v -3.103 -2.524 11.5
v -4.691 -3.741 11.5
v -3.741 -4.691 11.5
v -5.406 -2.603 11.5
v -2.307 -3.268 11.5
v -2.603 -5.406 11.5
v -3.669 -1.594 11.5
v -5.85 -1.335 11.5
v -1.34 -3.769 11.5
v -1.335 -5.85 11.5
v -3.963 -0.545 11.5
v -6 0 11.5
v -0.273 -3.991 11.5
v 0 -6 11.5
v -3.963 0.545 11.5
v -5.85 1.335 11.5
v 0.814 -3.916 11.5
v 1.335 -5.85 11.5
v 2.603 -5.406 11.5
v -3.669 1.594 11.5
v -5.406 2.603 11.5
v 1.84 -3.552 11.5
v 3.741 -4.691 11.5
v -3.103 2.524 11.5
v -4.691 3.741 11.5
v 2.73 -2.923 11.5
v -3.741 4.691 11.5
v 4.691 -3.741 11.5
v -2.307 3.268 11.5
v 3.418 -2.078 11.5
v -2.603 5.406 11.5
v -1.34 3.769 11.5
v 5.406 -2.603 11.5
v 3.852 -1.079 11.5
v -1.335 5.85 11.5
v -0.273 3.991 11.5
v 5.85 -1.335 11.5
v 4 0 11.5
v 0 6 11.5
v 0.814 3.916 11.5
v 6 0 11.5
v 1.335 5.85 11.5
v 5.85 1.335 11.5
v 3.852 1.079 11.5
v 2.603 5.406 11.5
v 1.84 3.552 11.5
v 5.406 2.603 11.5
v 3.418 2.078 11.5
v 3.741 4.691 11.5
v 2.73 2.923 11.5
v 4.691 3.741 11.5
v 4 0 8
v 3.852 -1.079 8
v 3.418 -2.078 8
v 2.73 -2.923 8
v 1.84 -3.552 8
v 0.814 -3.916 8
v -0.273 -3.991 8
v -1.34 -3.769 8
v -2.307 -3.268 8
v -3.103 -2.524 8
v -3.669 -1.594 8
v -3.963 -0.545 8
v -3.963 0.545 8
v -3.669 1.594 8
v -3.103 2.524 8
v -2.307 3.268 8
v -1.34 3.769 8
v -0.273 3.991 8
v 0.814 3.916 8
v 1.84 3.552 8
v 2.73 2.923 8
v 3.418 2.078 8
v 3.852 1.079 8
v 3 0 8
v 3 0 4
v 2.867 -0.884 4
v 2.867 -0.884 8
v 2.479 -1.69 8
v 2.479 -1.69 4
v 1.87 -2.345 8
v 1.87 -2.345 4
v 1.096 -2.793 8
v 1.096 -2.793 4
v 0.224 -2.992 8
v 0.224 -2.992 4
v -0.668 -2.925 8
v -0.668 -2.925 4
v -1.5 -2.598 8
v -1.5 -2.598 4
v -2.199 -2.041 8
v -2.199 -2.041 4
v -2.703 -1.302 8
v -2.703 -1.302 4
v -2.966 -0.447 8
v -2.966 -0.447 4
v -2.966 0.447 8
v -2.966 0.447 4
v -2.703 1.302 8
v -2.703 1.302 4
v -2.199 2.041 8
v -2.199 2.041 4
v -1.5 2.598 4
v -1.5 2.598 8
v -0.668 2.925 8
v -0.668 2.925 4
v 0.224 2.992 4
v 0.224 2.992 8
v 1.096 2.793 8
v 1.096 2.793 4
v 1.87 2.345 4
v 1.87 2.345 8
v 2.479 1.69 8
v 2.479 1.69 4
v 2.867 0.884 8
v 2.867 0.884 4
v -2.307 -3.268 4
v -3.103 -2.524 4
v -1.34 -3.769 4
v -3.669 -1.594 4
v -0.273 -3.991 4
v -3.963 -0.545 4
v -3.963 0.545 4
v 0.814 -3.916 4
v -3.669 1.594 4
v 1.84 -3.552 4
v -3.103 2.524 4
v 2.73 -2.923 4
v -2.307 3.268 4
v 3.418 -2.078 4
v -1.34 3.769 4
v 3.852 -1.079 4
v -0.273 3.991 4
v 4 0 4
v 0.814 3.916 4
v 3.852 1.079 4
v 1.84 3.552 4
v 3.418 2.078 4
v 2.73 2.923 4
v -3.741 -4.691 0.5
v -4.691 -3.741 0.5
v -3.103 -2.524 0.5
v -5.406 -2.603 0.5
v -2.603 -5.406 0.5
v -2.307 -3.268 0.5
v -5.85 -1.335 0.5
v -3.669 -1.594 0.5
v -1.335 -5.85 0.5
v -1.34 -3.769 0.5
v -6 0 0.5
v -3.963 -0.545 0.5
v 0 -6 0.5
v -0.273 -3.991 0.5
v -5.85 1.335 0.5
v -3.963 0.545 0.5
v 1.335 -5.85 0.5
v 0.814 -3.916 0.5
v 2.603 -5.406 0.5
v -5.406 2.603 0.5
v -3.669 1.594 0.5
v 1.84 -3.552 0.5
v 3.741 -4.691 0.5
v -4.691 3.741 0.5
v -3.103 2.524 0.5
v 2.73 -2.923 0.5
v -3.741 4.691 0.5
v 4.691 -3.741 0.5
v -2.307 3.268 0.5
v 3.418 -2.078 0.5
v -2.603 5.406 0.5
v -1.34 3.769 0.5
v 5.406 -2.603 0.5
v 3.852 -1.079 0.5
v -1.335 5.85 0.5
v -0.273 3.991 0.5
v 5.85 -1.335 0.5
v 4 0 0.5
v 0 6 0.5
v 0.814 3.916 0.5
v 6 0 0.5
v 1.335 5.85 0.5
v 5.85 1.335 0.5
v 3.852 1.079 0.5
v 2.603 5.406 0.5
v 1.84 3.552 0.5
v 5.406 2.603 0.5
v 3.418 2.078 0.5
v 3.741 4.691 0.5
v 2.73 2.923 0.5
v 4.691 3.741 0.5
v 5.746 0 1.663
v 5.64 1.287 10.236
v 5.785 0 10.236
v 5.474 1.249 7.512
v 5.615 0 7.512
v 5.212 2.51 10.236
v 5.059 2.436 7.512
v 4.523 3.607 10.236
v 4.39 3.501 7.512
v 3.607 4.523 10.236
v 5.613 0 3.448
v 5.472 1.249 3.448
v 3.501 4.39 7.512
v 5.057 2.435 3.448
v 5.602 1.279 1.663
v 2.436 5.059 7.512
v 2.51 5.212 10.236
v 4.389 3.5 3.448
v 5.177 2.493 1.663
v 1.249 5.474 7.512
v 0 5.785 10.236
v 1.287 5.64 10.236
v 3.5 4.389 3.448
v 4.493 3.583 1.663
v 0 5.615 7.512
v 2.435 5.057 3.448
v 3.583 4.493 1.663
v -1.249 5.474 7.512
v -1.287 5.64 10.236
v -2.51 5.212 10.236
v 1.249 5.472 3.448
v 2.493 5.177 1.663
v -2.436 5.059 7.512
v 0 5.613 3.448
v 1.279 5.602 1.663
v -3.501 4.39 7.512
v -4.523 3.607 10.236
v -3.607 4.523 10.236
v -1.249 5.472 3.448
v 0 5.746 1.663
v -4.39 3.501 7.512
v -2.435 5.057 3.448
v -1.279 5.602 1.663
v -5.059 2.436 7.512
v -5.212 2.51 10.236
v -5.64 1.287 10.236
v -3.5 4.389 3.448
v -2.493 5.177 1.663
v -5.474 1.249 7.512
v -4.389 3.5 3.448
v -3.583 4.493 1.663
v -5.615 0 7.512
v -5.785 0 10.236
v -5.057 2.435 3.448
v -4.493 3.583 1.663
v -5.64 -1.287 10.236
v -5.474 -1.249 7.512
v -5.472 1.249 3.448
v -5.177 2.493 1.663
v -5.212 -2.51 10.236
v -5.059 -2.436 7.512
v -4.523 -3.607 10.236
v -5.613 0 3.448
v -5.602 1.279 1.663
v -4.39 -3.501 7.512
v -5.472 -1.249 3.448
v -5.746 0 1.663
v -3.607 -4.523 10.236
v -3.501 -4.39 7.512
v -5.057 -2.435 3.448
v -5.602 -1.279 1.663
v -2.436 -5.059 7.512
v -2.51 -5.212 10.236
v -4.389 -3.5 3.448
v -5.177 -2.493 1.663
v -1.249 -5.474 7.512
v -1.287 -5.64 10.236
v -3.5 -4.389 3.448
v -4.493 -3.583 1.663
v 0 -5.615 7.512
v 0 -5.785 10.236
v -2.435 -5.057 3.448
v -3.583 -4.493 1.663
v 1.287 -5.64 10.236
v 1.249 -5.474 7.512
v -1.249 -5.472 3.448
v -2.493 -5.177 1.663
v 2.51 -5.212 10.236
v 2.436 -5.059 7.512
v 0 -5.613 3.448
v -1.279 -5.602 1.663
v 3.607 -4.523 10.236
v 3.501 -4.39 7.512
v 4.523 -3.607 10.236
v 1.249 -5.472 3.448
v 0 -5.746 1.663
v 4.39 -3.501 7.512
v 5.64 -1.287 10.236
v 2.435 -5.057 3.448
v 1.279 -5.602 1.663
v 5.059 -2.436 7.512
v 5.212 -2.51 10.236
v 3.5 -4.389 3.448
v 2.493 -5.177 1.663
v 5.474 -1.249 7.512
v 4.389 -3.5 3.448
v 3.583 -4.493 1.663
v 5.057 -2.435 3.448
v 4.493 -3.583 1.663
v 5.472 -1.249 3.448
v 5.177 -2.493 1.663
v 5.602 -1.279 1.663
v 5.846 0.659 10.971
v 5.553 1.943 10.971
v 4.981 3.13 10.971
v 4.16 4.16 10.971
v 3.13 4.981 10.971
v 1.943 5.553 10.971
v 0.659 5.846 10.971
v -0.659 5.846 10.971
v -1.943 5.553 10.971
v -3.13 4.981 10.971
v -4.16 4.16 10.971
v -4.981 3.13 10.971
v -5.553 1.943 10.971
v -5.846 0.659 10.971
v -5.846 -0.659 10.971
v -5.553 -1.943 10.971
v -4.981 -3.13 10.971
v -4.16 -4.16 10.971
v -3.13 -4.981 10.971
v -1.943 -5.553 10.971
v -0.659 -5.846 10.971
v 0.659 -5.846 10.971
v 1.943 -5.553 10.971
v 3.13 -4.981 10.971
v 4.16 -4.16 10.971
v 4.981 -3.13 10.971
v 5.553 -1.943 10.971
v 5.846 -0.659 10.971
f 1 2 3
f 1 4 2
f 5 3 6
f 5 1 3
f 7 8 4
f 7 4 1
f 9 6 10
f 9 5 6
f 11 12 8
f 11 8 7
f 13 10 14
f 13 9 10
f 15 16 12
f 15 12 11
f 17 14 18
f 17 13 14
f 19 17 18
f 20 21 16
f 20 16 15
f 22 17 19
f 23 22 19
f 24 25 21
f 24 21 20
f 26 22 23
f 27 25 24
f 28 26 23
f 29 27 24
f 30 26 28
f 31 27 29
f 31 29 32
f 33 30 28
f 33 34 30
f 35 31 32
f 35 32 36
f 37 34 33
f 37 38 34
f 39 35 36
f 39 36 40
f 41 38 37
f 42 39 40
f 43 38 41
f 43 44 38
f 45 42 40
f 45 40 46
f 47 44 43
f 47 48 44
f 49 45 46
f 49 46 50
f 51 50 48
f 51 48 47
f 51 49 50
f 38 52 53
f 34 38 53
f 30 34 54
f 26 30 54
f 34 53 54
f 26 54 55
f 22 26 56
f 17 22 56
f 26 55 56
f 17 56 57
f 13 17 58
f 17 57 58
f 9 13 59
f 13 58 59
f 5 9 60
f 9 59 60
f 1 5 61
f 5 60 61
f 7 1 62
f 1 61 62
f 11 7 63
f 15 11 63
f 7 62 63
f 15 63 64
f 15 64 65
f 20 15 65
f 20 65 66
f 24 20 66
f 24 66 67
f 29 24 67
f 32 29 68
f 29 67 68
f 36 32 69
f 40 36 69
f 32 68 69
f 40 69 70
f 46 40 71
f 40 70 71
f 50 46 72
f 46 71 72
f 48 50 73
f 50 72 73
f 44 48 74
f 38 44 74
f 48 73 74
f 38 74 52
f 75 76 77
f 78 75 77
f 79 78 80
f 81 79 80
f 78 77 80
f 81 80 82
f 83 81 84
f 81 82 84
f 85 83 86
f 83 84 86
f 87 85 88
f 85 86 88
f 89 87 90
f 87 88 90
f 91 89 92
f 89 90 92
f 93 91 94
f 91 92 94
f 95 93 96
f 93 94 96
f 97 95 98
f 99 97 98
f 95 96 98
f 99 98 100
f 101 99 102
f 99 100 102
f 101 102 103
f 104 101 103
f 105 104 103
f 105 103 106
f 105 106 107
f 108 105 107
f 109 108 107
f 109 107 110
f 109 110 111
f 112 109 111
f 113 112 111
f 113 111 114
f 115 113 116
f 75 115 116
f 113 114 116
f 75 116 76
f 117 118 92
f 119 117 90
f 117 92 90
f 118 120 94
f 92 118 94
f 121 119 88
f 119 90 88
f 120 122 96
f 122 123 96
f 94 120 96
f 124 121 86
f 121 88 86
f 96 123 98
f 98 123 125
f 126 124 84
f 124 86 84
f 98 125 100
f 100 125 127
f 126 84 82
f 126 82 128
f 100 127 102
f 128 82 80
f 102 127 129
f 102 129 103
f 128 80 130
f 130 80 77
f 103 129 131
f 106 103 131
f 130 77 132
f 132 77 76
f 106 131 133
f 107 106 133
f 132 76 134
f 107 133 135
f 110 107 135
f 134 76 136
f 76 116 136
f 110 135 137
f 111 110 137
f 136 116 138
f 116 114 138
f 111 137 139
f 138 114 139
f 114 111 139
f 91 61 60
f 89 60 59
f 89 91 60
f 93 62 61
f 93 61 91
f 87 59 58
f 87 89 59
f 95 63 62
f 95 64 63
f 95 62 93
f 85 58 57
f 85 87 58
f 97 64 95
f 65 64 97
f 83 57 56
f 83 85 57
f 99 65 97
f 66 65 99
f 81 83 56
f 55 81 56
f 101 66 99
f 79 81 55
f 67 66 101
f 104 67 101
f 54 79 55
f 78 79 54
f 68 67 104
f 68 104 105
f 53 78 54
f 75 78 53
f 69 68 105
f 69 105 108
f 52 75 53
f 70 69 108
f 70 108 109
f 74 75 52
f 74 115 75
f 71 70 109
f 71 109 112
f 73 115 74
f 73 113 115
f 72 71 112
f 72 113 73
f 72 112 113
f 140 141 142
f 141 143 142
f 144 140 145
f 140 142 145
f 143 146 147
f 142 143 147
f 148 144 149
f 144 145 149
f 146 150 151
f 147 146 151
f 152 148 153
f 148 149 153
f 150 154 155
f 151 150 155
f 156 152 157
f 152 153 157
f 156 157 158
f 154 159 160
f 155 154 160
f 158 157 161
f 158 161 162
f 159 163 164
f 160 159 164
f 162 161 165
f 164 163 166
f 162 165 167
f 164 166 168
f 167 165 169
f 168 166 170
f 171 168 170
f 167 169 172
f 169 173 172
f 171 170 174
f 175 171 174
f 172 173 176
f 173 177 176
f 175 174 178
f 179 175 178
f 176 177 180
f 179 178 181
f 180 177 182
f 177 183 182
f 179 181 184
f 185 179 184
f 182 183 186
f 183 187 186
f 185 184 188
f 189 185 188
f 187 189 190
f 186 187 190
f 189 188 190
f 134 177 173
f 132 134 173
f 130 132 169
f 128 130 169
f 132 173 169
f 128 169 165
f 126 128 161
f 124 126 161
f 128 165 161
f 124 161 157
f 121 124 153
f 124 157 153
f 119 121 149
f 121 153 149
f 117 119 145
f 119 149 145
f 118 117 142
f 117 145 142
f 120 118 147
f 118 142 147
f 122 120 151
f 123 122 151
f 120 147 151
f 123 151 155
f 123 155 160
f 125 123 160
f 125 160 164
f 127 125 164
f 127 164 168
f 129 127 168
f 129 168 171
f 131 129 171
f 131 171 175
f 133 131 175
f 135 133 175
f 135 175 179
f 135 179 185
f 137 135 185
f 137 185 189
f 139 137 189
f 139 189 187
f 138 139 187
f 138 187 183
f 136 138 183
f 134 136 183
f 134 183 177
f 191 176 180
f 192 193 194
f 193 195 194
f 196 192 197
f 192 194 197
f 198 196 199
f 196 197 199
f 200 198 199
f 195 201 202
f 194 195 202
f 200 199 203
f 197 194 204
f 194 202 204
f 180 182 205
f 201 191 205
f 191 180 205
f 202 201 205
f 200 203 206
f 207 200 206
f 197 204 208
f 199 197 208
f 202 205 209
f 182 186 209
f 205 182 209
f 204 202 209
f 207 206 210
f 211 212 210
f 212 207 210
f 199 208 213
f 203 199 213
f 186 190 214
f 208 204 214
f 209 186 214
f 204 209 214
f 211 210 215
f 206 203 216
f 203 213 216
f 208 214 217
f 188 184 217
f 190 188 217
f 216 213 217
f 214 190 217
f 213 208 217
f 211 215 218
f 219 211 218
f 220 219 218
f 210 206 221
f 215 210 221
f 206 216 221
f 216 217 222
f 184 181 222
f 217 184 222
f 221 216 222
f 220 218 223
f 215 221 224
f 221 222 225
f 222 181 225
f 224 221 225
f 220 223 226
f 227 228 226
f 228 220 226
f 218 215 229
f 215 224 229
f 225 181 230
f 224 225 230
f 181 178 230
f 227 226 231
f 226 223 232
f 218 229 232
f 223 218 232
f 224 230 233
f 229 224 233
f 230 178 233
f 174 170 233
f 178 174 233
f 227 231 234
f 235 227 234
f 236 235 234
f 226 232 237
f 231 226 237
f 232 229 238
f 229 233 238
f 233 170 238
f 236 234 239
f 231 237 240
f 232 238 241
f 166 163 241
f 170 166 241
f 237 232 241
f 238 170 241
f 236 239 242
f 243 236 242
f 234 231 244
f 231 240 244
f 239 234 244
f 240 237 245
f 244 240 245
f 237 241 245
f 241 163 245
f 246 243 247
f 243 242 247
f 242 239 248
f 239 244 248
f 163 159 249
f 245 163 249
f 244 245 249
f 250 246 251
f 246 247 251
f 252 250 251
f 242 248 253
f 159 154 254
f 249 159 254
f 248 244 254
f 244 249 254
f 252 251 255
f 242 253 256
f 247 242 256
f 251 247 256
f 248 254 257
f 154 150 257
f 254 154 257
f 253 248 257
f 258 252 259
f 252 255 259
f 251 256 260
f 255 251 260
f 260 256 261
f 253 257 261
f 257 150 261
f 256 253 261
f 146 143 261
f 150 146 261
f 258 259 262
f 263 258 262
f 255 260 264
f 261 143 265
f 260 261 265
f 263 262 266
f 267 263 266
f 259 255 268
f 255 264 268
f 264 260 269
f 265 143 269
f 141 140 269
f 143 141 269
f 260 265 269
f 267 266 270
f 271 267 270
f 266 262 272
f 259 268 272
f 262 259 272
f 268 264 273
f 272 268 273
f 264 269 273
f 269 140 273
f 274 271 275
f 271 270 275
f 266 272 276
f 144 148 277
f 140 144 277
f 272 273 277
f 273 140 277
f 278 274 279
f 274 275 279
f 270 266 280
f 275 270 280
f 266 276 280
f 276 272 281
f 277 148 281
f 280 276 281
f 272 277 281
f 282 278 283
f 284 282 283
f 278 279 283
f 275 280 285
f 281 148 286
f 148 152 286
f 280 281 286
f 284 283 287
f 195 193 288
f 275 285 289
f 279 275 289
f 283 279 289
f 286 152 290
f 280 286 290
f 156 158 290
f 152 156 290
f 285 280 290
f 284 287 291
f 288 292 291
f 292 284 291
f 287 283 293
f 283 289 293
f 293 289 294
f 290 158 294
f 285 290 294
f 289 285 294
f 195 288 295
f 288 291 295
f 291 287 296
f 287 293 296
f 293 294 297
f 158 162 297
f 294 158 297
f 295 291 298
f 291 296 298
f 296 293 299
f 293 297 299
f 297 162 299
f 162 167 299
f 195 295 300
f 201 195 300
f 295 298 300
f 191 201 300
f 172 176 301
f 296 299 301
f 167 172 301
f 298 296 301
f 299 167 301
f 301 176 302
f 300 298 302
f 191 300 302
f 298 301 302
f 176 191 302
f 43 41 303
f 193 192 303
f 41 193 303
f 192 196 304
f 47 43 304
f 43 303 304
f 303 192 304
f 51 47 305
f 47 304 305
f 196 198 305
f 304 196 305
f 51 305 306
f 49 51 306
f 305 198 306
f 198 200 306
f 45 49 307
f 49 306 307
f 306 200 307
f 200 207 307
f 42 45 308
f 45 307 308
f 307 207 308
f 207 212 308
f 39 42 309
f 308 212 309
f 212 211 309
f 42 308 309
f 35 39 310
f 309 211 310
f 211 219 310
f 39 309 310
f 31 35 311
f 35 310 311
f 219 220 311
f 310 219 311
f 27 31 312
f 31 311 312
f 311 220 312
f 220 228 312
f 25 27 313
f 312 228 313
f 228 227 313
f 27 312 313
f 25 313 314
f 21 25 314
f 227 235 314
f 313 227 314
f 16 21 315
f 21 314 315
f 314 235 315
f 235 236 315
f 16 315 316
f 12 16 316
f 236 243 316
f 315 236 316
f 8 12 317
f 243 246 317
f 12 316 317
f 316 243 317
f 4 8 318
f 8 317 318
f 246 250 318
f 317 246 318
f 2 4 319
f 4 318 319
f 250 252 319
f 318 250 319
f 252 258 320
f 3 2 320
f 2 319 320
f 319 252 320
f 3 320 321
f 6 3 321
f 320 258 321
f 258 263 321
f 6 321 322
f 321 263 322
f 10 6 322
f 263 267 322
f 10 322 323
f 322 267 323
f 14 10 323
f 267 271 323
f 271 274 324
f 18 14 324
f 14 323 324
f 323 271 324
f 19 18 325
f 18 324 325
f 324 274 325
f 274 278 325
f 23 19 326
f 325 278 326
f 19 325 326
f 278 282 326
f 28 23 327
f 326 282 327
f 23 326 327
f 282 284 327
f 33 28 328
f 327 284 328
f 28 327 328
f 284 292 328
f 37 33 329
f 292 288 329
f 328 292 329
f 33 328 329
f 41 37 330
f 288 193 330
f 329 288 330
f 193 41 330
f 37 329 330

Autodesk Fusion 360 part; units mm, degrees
sketch "Sketch1" plane through (0, 0, 0) normal (0, 0, 1) x (1, 0, 0)
  circle A0 centre (0, 0) radius 4
  circle A1 centre (0, 0) radius 6
  circle A2 centre (0, 0) radius 3
  dimension "d1" = 8
  dimension "d2" = 12
  dimension "d3" = 6
extrude "Extrude1" add sketch "Sketch1" along normal blind 4 contours A1
extrude "Extrude2" add sketch "Sketch1" along normal blind 7.5 from surface at 4 contours A0 | A1
extrude "Extrude3" cut sketch "Sketch1" along normal blind 4 from surface at 8 contours A0
move_face "OffsetFaces1" offset -0.5 1 faces at (5.2961, -0.4968, 0)
sketch "Sketch2" plane through (0, 0, 0) normal (0, 1, 0) x (1, 0, 0)
  line L0 (6, -0.5) -> (6, -11.5)
  spline S0 degree 5 poles (6, -11.5) (5.9399, -11.2998) (5.8306, -10.7774) (5.6989, -9.6281) (5.5847, -7.5081) (5.5492, -4.5095) (5.6313, -2.3856) (5.7779, -1.2306) (5.9188, -0.7031) (6, -0.5) knots 0 0 0 0 0 0 0.2 0.4 0.6 0.8 1 1 1 1 1 1
  line L1 (5.8, -1) -> (6.2, 0)
  line L2 (6.15, -12) -> (5.85, -11)
  line L3 (6, -11.5) -> (6, -0.5)
revolve "Revolve1" cut sketch "Sketch2" angle 360 about axis through (0, 0, 1.75) along (0, 0, 1)
equation "d7 = 8 mm - 0.5 mm"
